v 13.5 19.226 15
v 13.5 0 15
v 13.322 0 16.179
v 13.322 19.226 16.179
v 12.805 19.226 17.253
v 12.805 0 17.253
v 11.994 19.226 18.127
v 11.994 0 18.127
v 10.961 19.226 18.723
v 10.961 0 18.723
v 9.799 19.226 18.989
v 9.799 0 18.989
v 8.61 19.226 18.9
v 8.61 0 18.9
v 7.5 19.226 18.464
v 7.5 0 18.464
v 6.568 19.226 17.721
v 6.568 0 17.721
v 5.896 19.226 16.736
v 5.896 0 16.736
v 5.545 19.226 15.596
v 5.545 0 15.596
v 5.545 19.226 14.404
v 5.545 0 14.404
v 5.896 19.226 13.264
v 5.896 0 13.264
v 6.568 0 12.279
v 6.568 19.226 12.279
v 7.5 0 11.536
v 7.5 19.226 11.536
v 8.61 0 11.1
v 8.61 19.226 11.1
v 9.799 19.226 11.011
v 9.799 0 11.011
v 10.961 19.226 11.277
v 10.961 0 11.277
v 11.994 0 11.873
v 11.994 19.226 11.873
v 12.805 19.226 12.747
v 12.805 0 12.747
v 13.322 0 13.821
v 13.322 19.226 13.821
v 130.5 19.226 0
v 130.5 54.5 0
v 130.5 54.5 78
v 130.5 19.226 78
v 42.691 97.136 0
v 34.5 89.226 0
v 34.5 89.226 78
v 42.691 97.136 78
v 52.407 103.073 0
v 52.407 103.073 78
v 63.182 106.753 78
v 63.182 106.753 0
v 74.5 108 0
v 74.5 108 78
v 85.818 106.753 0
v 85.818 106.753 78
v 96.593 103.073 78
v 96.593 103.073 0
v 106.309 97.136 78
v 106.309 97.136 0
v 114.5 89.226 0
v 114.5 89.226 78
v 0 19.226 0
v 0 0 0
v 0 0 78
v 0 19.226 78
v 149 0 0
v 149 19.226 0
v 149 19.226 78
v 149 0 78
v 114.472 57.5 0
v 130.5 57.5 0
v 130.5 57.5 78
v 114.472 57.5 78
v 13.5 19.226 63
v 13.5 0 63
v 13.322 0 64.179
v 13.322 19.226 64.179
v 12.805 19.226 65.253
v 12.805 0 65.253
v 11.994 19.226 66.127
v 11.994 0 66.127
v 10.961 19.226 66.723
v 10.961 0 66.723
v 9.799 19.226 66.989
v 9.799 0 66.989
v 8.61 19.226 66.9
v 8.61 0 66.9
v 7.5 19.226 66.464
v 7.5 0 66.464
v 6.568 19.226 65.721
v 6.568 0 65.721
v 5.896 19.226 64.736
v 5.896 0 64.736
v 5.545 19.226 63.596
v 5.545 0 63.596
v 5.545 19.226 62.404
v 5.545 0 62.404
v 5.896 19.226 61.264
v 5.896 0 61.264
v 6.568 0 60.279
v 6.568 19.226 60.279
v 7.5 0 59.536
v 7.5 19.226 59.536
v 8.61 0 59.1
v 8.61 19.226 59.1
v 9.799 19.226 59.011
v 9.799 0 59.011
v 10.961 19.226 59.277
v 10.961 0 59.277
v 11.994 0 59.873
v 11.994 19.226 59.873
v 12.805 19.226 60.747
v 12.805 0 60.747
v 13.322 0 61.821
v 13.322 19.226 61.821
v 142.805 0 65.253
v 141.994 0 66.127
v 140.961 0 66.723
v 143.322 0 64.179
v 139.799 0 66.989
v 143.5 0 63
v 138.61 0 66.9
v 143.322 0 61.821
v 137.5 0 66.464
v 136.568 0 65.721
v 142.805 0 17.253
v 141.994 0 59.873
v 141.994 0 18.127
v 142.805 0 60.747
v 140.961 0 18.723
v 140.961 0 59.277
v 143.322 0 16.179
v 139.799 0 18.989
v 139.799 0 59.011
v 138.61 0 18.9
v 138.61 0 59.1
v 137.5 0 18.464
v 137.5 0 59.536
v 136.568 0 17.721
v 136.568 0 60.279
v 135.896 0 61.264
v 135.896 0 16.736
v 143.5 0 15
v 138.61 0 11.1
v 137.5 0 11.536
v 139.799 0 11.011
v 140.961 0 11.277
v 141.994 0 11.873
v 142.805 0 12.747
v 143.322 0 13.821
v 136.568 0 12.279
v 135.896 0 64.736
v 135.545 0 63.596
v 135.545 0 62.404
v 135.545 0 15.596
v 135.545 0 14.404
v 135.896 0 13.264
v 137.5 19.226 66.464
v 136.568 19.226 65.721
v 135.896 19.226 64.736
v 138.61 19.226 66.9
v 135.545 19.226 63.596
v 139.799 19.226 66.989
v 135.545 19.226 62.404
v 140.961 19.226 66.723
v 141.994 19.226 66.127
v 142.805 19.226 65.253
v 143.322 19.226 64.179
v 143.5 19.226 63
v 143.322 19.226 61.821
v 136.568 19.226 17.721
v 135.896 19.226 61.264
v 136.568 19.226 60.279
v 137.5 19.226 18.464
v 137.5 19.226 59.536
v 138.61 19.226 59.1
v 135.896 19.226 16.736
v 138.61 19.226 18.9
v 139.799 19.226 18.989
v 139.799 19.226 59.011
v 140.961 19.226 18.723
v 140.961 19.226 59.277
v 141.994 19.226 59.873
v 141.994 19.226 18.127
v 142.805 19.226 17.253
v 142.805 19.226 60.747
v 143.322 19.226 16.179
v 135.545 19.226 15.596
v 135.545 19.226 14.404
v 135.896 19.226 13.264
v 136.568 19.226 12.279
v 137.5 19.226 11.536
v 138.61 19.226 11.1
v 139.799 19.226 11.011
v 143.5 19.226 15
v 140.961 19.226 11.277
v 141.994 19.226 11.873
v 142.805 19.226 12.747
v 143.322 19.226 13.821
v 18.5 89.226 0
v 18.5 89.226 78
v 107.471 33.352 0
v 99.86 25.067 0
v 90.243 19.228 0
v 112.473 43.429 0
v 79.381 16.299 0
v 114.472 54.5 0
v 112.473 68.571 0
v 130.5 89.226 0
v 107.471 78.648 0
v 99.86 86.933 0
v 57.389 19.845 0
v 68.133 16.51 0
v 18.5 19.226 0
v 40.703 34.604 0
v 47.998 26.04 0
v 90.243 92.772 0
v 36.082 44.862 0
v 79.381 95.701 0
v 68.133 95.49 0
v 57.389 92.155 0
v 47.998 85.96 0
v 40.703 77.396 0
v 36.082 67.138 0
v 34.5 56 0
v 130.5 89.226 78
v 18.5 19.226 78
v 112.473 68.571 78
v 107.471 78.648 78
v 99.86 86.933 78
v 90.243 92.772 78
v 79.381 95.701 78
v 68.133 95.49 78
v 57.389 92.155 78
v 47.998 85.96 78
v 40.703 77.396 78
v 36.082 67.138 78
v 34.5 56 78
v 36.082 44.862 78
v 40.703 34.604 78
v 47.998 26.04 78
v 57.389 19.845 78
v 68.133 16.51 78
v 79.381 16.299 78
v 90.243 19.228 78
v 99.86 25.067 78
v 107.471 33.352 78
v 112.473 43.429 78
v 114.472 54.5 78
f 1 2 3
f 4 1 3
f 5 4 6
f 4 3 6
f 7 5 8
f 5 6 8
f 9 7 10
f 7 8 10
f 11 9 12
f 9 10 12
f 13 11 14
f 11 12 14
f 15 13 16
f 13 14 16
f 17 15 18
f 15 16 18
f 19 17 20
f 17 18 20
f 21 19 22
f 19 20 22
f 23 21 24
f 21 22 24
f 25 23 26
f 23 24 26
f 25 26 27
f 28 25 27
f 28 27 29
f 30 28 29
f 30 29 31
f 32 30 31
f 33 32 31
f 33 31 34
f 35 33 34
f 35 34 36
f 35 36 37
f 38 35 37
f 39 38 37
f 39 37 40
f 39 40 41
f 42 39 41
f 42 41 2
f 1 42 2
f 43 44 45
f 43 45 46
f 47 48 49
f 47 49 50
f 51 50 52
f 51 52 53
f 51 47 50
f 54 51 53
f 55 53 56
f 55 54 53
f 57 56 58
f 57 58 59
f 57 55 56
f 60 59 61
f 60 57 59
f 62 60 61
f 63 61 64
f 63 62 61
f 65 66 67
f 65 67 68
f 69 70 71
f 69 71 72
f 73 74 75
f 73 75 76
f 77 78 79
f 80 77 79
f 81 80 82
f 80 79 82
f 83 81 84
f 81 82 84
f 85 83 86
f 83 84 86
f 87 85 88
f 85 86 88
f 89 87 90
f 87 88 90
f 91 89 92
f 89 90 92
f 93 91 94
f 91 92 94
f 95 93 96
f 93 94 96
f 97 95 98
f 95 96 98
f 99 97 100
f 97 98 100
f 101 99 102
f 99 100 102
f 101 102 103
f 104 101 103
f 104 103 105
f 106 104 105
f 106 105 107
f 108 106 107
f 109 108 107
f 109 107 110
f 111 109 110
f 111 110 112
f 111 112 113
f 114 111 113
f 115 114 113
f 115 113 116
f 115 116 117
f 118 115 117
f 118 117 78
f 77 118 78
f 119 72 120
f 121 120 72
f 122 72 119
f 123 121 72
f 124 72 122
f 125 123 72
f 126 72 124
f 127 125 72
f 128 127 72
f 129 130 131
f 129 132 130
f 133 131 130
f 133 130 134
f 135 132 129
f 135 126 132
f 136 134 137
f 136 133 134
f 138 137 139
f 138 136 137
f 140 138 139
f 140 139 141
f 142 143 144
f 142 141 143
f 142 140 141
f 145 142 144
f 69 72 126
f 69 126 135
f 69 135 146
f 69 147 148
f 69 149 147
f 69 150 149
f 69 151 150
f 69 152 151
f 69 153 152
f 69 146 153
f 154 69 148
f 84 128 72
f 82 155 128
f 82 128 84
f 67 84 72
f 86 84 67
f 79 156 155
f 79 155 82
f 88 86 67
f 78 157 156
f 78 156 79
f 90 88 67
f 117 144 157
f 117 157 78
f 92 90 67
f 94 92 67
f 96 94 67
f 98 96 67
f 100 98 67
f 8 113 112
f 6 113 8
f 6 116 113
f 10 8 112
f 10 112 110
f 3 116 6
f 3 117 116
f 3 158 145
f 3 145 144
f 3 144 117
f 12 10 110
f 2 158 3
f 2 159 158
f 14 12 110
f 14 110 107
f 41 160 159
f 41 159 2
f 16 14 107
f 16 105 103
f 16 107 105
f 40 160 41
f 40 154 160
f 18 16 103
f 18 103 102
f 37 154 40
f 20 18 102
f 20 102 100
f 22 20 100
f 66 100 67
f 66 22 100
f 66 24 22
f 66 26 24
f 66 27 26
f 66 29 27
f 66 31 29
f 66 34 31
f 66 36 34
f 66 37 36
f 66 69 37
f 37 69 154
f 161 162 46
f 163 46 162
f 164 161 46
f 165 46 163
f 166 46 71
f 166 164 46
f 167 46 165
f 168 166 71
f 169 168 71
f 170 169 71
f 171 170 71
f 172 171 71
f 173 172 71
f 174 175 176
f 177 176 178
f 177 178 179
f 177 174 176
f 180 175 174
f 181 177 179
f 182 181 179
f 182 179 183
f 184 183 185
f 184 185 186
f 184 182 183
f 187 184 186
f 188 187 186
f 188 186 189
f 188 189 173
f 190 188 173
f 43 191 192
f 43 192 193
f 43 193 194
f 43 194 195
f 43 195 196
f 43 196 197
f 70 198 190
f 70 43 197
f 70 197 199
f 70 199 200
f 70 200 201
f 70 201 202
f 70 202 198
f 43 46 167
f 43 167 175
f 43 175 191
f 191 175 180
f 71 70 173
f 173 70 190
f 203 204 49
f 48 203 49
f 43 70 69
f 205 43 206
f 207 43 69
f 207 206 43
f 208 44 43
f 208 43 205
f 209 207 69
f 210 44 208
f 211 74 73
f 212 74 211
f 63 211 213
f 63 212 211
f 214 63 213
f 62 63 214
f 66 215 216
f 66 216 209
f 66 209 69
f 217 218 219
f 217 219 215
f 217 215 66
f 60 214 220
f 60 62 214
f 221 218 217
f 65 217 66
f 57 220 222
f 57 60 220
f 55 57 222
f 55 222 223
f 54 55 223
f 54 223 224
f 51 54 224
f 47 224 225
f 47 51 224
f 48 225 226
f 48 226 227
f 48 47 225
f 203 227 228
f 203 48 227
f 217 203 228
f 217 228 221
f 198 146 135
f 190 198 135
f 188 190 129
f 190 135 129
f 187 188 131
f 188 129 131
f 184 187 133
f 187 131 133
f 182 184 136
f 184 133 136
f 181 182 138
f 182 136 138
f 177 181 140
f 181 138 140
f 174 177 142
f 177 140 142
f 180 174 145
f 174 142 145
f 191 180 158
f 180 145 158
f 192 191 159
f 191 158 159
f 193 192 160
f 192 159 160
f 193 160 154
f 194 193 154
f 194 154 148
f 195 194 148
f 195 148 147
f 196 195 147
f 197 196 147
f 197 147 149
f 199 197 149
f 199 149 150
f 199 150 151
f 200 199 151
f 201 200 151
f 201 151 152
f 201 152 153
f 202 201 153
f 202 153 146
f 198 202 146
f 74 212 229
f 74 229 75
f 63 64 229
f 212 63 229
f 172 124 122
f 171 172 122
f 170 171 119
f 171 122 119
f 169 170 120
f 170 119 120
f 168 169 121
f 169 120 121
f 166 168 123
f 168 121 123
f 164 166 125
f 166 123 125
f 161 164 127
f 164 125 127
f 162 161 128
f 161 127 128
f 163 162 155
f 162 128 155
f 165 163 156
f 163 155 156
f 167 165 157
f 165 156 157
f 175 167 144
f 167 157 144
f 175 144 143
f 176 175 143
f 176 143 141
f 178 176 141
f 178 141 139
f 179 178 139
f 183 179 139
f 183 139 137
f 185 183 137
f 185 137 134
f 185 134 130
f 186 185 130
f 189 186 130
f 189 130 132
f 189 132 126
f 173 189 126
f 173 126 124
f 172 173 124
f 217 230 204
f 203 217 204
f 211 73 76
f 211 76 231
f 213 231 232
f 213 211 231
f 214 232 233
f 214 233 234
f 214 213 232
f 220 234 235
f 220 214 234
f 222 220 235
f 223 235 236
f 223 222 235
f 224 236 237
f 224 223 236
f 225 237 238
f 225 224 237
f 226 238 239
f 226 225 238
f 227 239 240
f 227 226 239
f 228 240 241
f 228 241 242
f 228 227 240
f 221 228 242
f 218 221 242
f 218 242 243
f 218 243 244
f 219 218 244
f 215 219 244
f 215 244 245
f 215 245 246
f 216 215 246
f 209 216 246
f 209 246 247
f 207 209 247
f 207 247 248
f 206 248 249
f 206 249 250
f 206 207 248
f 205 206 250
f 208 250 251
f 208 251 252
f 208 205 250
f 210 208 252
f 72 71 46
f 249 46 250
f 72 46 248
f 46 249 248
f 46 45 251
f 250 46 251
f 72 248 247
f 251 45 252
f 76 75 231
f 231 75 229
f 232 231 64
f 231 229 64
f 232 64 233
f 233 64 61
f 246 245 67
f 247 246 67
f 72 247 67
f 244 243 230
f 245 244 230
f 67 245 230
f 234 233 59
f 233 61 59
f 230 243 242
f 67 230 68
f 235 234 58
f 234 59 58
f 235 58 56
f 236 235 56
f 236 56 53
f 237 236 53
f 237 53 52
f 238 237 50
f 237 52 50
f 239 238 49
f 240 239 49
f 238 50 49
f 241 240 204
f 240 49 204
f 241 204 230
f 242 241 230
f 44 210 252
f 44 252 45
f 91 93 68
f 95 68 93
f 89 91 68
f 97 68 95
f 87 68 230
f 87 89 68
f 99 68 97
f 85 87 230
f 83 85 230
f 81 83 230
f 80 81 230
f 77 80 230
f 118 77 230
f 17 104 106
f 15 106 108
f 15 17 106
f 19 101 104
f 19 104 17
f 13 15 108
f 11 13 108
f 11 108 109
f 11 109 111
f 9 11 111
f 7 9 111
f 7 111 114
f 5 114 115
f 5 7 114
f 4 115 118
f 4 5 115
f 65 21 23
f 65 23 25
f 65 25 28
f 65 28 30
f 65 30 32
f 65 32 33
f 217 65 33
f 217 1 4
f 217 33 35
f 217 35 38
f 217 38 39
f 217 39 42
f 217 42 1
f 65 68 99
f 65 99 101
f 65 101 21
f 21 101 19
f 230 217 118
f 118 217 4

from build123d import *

# Parameters (mm, degrees)
BOSS_EXTRUDE1_DEPTH = 78
SKETCH2_R           = 4
CUT_EXTRUDE1_DEPTH  = 200.872459333


with BuildPart() as part:
    # Sketch1 → Boss-Extrude1 (new body)
    with BuildSketch(Plane.XY):
        with BuildLine():
            Line((0, 19.226495452), (18.5, 19.226495452))
            Line((18.5, 19.226495452), (18.5, 89.226495452))
            Line((18.5, 89.226495452), (34.5, 89.226495452))
            ThreePointArc((34.5, 89.226495452), (74.5, 108), (114.5, 89.226495452))
            Line((114.5, 89.226495452), (130.5, 89.226495452))
            Line((130.5, 89.226495452), (130.5, 57.5))
            Line((130.5, 57.5), (114.471865105, 57.5))
            ThreePointArc((114.471865105, 57.5), (34.5, 56), (114.471865105, 54.5))
            Line((114.471865105, 54.5), (130.5, 54.5))
            Line((130.5, 54.5), (130.5, 19.226495452))
            Line((130.5, 19.226495452), (149, 19.226495452))
            Line((149, 19.226495452), (149, 0))
            Line((149, 0), (0, 0))
            Line((0, 0), (0, 19.226495452))
        make_face()
    extrude(amount=BOSS_EXTRUDE1_DEPTH)

    # Sketch2 → Cut-Extrude1 (cut, through all)
    with BuildSketch(Plane.XZ):
        with Locations((9.5, 63)):
            Circle(SKETCH2_R)
        with Locations((139.5, 63)):
            Circle(SKETCH2_R)
        with Locations((9.5, 15)):
            Circle(SKETCH2_R)
        with Locations((139.5, 15)):
            Circle(SKETCH2_R)
    extrude(amount=-CUT_EXTRUDE1_DEPTH, mode=Mode.SUBTRACT)


solid = part.part
